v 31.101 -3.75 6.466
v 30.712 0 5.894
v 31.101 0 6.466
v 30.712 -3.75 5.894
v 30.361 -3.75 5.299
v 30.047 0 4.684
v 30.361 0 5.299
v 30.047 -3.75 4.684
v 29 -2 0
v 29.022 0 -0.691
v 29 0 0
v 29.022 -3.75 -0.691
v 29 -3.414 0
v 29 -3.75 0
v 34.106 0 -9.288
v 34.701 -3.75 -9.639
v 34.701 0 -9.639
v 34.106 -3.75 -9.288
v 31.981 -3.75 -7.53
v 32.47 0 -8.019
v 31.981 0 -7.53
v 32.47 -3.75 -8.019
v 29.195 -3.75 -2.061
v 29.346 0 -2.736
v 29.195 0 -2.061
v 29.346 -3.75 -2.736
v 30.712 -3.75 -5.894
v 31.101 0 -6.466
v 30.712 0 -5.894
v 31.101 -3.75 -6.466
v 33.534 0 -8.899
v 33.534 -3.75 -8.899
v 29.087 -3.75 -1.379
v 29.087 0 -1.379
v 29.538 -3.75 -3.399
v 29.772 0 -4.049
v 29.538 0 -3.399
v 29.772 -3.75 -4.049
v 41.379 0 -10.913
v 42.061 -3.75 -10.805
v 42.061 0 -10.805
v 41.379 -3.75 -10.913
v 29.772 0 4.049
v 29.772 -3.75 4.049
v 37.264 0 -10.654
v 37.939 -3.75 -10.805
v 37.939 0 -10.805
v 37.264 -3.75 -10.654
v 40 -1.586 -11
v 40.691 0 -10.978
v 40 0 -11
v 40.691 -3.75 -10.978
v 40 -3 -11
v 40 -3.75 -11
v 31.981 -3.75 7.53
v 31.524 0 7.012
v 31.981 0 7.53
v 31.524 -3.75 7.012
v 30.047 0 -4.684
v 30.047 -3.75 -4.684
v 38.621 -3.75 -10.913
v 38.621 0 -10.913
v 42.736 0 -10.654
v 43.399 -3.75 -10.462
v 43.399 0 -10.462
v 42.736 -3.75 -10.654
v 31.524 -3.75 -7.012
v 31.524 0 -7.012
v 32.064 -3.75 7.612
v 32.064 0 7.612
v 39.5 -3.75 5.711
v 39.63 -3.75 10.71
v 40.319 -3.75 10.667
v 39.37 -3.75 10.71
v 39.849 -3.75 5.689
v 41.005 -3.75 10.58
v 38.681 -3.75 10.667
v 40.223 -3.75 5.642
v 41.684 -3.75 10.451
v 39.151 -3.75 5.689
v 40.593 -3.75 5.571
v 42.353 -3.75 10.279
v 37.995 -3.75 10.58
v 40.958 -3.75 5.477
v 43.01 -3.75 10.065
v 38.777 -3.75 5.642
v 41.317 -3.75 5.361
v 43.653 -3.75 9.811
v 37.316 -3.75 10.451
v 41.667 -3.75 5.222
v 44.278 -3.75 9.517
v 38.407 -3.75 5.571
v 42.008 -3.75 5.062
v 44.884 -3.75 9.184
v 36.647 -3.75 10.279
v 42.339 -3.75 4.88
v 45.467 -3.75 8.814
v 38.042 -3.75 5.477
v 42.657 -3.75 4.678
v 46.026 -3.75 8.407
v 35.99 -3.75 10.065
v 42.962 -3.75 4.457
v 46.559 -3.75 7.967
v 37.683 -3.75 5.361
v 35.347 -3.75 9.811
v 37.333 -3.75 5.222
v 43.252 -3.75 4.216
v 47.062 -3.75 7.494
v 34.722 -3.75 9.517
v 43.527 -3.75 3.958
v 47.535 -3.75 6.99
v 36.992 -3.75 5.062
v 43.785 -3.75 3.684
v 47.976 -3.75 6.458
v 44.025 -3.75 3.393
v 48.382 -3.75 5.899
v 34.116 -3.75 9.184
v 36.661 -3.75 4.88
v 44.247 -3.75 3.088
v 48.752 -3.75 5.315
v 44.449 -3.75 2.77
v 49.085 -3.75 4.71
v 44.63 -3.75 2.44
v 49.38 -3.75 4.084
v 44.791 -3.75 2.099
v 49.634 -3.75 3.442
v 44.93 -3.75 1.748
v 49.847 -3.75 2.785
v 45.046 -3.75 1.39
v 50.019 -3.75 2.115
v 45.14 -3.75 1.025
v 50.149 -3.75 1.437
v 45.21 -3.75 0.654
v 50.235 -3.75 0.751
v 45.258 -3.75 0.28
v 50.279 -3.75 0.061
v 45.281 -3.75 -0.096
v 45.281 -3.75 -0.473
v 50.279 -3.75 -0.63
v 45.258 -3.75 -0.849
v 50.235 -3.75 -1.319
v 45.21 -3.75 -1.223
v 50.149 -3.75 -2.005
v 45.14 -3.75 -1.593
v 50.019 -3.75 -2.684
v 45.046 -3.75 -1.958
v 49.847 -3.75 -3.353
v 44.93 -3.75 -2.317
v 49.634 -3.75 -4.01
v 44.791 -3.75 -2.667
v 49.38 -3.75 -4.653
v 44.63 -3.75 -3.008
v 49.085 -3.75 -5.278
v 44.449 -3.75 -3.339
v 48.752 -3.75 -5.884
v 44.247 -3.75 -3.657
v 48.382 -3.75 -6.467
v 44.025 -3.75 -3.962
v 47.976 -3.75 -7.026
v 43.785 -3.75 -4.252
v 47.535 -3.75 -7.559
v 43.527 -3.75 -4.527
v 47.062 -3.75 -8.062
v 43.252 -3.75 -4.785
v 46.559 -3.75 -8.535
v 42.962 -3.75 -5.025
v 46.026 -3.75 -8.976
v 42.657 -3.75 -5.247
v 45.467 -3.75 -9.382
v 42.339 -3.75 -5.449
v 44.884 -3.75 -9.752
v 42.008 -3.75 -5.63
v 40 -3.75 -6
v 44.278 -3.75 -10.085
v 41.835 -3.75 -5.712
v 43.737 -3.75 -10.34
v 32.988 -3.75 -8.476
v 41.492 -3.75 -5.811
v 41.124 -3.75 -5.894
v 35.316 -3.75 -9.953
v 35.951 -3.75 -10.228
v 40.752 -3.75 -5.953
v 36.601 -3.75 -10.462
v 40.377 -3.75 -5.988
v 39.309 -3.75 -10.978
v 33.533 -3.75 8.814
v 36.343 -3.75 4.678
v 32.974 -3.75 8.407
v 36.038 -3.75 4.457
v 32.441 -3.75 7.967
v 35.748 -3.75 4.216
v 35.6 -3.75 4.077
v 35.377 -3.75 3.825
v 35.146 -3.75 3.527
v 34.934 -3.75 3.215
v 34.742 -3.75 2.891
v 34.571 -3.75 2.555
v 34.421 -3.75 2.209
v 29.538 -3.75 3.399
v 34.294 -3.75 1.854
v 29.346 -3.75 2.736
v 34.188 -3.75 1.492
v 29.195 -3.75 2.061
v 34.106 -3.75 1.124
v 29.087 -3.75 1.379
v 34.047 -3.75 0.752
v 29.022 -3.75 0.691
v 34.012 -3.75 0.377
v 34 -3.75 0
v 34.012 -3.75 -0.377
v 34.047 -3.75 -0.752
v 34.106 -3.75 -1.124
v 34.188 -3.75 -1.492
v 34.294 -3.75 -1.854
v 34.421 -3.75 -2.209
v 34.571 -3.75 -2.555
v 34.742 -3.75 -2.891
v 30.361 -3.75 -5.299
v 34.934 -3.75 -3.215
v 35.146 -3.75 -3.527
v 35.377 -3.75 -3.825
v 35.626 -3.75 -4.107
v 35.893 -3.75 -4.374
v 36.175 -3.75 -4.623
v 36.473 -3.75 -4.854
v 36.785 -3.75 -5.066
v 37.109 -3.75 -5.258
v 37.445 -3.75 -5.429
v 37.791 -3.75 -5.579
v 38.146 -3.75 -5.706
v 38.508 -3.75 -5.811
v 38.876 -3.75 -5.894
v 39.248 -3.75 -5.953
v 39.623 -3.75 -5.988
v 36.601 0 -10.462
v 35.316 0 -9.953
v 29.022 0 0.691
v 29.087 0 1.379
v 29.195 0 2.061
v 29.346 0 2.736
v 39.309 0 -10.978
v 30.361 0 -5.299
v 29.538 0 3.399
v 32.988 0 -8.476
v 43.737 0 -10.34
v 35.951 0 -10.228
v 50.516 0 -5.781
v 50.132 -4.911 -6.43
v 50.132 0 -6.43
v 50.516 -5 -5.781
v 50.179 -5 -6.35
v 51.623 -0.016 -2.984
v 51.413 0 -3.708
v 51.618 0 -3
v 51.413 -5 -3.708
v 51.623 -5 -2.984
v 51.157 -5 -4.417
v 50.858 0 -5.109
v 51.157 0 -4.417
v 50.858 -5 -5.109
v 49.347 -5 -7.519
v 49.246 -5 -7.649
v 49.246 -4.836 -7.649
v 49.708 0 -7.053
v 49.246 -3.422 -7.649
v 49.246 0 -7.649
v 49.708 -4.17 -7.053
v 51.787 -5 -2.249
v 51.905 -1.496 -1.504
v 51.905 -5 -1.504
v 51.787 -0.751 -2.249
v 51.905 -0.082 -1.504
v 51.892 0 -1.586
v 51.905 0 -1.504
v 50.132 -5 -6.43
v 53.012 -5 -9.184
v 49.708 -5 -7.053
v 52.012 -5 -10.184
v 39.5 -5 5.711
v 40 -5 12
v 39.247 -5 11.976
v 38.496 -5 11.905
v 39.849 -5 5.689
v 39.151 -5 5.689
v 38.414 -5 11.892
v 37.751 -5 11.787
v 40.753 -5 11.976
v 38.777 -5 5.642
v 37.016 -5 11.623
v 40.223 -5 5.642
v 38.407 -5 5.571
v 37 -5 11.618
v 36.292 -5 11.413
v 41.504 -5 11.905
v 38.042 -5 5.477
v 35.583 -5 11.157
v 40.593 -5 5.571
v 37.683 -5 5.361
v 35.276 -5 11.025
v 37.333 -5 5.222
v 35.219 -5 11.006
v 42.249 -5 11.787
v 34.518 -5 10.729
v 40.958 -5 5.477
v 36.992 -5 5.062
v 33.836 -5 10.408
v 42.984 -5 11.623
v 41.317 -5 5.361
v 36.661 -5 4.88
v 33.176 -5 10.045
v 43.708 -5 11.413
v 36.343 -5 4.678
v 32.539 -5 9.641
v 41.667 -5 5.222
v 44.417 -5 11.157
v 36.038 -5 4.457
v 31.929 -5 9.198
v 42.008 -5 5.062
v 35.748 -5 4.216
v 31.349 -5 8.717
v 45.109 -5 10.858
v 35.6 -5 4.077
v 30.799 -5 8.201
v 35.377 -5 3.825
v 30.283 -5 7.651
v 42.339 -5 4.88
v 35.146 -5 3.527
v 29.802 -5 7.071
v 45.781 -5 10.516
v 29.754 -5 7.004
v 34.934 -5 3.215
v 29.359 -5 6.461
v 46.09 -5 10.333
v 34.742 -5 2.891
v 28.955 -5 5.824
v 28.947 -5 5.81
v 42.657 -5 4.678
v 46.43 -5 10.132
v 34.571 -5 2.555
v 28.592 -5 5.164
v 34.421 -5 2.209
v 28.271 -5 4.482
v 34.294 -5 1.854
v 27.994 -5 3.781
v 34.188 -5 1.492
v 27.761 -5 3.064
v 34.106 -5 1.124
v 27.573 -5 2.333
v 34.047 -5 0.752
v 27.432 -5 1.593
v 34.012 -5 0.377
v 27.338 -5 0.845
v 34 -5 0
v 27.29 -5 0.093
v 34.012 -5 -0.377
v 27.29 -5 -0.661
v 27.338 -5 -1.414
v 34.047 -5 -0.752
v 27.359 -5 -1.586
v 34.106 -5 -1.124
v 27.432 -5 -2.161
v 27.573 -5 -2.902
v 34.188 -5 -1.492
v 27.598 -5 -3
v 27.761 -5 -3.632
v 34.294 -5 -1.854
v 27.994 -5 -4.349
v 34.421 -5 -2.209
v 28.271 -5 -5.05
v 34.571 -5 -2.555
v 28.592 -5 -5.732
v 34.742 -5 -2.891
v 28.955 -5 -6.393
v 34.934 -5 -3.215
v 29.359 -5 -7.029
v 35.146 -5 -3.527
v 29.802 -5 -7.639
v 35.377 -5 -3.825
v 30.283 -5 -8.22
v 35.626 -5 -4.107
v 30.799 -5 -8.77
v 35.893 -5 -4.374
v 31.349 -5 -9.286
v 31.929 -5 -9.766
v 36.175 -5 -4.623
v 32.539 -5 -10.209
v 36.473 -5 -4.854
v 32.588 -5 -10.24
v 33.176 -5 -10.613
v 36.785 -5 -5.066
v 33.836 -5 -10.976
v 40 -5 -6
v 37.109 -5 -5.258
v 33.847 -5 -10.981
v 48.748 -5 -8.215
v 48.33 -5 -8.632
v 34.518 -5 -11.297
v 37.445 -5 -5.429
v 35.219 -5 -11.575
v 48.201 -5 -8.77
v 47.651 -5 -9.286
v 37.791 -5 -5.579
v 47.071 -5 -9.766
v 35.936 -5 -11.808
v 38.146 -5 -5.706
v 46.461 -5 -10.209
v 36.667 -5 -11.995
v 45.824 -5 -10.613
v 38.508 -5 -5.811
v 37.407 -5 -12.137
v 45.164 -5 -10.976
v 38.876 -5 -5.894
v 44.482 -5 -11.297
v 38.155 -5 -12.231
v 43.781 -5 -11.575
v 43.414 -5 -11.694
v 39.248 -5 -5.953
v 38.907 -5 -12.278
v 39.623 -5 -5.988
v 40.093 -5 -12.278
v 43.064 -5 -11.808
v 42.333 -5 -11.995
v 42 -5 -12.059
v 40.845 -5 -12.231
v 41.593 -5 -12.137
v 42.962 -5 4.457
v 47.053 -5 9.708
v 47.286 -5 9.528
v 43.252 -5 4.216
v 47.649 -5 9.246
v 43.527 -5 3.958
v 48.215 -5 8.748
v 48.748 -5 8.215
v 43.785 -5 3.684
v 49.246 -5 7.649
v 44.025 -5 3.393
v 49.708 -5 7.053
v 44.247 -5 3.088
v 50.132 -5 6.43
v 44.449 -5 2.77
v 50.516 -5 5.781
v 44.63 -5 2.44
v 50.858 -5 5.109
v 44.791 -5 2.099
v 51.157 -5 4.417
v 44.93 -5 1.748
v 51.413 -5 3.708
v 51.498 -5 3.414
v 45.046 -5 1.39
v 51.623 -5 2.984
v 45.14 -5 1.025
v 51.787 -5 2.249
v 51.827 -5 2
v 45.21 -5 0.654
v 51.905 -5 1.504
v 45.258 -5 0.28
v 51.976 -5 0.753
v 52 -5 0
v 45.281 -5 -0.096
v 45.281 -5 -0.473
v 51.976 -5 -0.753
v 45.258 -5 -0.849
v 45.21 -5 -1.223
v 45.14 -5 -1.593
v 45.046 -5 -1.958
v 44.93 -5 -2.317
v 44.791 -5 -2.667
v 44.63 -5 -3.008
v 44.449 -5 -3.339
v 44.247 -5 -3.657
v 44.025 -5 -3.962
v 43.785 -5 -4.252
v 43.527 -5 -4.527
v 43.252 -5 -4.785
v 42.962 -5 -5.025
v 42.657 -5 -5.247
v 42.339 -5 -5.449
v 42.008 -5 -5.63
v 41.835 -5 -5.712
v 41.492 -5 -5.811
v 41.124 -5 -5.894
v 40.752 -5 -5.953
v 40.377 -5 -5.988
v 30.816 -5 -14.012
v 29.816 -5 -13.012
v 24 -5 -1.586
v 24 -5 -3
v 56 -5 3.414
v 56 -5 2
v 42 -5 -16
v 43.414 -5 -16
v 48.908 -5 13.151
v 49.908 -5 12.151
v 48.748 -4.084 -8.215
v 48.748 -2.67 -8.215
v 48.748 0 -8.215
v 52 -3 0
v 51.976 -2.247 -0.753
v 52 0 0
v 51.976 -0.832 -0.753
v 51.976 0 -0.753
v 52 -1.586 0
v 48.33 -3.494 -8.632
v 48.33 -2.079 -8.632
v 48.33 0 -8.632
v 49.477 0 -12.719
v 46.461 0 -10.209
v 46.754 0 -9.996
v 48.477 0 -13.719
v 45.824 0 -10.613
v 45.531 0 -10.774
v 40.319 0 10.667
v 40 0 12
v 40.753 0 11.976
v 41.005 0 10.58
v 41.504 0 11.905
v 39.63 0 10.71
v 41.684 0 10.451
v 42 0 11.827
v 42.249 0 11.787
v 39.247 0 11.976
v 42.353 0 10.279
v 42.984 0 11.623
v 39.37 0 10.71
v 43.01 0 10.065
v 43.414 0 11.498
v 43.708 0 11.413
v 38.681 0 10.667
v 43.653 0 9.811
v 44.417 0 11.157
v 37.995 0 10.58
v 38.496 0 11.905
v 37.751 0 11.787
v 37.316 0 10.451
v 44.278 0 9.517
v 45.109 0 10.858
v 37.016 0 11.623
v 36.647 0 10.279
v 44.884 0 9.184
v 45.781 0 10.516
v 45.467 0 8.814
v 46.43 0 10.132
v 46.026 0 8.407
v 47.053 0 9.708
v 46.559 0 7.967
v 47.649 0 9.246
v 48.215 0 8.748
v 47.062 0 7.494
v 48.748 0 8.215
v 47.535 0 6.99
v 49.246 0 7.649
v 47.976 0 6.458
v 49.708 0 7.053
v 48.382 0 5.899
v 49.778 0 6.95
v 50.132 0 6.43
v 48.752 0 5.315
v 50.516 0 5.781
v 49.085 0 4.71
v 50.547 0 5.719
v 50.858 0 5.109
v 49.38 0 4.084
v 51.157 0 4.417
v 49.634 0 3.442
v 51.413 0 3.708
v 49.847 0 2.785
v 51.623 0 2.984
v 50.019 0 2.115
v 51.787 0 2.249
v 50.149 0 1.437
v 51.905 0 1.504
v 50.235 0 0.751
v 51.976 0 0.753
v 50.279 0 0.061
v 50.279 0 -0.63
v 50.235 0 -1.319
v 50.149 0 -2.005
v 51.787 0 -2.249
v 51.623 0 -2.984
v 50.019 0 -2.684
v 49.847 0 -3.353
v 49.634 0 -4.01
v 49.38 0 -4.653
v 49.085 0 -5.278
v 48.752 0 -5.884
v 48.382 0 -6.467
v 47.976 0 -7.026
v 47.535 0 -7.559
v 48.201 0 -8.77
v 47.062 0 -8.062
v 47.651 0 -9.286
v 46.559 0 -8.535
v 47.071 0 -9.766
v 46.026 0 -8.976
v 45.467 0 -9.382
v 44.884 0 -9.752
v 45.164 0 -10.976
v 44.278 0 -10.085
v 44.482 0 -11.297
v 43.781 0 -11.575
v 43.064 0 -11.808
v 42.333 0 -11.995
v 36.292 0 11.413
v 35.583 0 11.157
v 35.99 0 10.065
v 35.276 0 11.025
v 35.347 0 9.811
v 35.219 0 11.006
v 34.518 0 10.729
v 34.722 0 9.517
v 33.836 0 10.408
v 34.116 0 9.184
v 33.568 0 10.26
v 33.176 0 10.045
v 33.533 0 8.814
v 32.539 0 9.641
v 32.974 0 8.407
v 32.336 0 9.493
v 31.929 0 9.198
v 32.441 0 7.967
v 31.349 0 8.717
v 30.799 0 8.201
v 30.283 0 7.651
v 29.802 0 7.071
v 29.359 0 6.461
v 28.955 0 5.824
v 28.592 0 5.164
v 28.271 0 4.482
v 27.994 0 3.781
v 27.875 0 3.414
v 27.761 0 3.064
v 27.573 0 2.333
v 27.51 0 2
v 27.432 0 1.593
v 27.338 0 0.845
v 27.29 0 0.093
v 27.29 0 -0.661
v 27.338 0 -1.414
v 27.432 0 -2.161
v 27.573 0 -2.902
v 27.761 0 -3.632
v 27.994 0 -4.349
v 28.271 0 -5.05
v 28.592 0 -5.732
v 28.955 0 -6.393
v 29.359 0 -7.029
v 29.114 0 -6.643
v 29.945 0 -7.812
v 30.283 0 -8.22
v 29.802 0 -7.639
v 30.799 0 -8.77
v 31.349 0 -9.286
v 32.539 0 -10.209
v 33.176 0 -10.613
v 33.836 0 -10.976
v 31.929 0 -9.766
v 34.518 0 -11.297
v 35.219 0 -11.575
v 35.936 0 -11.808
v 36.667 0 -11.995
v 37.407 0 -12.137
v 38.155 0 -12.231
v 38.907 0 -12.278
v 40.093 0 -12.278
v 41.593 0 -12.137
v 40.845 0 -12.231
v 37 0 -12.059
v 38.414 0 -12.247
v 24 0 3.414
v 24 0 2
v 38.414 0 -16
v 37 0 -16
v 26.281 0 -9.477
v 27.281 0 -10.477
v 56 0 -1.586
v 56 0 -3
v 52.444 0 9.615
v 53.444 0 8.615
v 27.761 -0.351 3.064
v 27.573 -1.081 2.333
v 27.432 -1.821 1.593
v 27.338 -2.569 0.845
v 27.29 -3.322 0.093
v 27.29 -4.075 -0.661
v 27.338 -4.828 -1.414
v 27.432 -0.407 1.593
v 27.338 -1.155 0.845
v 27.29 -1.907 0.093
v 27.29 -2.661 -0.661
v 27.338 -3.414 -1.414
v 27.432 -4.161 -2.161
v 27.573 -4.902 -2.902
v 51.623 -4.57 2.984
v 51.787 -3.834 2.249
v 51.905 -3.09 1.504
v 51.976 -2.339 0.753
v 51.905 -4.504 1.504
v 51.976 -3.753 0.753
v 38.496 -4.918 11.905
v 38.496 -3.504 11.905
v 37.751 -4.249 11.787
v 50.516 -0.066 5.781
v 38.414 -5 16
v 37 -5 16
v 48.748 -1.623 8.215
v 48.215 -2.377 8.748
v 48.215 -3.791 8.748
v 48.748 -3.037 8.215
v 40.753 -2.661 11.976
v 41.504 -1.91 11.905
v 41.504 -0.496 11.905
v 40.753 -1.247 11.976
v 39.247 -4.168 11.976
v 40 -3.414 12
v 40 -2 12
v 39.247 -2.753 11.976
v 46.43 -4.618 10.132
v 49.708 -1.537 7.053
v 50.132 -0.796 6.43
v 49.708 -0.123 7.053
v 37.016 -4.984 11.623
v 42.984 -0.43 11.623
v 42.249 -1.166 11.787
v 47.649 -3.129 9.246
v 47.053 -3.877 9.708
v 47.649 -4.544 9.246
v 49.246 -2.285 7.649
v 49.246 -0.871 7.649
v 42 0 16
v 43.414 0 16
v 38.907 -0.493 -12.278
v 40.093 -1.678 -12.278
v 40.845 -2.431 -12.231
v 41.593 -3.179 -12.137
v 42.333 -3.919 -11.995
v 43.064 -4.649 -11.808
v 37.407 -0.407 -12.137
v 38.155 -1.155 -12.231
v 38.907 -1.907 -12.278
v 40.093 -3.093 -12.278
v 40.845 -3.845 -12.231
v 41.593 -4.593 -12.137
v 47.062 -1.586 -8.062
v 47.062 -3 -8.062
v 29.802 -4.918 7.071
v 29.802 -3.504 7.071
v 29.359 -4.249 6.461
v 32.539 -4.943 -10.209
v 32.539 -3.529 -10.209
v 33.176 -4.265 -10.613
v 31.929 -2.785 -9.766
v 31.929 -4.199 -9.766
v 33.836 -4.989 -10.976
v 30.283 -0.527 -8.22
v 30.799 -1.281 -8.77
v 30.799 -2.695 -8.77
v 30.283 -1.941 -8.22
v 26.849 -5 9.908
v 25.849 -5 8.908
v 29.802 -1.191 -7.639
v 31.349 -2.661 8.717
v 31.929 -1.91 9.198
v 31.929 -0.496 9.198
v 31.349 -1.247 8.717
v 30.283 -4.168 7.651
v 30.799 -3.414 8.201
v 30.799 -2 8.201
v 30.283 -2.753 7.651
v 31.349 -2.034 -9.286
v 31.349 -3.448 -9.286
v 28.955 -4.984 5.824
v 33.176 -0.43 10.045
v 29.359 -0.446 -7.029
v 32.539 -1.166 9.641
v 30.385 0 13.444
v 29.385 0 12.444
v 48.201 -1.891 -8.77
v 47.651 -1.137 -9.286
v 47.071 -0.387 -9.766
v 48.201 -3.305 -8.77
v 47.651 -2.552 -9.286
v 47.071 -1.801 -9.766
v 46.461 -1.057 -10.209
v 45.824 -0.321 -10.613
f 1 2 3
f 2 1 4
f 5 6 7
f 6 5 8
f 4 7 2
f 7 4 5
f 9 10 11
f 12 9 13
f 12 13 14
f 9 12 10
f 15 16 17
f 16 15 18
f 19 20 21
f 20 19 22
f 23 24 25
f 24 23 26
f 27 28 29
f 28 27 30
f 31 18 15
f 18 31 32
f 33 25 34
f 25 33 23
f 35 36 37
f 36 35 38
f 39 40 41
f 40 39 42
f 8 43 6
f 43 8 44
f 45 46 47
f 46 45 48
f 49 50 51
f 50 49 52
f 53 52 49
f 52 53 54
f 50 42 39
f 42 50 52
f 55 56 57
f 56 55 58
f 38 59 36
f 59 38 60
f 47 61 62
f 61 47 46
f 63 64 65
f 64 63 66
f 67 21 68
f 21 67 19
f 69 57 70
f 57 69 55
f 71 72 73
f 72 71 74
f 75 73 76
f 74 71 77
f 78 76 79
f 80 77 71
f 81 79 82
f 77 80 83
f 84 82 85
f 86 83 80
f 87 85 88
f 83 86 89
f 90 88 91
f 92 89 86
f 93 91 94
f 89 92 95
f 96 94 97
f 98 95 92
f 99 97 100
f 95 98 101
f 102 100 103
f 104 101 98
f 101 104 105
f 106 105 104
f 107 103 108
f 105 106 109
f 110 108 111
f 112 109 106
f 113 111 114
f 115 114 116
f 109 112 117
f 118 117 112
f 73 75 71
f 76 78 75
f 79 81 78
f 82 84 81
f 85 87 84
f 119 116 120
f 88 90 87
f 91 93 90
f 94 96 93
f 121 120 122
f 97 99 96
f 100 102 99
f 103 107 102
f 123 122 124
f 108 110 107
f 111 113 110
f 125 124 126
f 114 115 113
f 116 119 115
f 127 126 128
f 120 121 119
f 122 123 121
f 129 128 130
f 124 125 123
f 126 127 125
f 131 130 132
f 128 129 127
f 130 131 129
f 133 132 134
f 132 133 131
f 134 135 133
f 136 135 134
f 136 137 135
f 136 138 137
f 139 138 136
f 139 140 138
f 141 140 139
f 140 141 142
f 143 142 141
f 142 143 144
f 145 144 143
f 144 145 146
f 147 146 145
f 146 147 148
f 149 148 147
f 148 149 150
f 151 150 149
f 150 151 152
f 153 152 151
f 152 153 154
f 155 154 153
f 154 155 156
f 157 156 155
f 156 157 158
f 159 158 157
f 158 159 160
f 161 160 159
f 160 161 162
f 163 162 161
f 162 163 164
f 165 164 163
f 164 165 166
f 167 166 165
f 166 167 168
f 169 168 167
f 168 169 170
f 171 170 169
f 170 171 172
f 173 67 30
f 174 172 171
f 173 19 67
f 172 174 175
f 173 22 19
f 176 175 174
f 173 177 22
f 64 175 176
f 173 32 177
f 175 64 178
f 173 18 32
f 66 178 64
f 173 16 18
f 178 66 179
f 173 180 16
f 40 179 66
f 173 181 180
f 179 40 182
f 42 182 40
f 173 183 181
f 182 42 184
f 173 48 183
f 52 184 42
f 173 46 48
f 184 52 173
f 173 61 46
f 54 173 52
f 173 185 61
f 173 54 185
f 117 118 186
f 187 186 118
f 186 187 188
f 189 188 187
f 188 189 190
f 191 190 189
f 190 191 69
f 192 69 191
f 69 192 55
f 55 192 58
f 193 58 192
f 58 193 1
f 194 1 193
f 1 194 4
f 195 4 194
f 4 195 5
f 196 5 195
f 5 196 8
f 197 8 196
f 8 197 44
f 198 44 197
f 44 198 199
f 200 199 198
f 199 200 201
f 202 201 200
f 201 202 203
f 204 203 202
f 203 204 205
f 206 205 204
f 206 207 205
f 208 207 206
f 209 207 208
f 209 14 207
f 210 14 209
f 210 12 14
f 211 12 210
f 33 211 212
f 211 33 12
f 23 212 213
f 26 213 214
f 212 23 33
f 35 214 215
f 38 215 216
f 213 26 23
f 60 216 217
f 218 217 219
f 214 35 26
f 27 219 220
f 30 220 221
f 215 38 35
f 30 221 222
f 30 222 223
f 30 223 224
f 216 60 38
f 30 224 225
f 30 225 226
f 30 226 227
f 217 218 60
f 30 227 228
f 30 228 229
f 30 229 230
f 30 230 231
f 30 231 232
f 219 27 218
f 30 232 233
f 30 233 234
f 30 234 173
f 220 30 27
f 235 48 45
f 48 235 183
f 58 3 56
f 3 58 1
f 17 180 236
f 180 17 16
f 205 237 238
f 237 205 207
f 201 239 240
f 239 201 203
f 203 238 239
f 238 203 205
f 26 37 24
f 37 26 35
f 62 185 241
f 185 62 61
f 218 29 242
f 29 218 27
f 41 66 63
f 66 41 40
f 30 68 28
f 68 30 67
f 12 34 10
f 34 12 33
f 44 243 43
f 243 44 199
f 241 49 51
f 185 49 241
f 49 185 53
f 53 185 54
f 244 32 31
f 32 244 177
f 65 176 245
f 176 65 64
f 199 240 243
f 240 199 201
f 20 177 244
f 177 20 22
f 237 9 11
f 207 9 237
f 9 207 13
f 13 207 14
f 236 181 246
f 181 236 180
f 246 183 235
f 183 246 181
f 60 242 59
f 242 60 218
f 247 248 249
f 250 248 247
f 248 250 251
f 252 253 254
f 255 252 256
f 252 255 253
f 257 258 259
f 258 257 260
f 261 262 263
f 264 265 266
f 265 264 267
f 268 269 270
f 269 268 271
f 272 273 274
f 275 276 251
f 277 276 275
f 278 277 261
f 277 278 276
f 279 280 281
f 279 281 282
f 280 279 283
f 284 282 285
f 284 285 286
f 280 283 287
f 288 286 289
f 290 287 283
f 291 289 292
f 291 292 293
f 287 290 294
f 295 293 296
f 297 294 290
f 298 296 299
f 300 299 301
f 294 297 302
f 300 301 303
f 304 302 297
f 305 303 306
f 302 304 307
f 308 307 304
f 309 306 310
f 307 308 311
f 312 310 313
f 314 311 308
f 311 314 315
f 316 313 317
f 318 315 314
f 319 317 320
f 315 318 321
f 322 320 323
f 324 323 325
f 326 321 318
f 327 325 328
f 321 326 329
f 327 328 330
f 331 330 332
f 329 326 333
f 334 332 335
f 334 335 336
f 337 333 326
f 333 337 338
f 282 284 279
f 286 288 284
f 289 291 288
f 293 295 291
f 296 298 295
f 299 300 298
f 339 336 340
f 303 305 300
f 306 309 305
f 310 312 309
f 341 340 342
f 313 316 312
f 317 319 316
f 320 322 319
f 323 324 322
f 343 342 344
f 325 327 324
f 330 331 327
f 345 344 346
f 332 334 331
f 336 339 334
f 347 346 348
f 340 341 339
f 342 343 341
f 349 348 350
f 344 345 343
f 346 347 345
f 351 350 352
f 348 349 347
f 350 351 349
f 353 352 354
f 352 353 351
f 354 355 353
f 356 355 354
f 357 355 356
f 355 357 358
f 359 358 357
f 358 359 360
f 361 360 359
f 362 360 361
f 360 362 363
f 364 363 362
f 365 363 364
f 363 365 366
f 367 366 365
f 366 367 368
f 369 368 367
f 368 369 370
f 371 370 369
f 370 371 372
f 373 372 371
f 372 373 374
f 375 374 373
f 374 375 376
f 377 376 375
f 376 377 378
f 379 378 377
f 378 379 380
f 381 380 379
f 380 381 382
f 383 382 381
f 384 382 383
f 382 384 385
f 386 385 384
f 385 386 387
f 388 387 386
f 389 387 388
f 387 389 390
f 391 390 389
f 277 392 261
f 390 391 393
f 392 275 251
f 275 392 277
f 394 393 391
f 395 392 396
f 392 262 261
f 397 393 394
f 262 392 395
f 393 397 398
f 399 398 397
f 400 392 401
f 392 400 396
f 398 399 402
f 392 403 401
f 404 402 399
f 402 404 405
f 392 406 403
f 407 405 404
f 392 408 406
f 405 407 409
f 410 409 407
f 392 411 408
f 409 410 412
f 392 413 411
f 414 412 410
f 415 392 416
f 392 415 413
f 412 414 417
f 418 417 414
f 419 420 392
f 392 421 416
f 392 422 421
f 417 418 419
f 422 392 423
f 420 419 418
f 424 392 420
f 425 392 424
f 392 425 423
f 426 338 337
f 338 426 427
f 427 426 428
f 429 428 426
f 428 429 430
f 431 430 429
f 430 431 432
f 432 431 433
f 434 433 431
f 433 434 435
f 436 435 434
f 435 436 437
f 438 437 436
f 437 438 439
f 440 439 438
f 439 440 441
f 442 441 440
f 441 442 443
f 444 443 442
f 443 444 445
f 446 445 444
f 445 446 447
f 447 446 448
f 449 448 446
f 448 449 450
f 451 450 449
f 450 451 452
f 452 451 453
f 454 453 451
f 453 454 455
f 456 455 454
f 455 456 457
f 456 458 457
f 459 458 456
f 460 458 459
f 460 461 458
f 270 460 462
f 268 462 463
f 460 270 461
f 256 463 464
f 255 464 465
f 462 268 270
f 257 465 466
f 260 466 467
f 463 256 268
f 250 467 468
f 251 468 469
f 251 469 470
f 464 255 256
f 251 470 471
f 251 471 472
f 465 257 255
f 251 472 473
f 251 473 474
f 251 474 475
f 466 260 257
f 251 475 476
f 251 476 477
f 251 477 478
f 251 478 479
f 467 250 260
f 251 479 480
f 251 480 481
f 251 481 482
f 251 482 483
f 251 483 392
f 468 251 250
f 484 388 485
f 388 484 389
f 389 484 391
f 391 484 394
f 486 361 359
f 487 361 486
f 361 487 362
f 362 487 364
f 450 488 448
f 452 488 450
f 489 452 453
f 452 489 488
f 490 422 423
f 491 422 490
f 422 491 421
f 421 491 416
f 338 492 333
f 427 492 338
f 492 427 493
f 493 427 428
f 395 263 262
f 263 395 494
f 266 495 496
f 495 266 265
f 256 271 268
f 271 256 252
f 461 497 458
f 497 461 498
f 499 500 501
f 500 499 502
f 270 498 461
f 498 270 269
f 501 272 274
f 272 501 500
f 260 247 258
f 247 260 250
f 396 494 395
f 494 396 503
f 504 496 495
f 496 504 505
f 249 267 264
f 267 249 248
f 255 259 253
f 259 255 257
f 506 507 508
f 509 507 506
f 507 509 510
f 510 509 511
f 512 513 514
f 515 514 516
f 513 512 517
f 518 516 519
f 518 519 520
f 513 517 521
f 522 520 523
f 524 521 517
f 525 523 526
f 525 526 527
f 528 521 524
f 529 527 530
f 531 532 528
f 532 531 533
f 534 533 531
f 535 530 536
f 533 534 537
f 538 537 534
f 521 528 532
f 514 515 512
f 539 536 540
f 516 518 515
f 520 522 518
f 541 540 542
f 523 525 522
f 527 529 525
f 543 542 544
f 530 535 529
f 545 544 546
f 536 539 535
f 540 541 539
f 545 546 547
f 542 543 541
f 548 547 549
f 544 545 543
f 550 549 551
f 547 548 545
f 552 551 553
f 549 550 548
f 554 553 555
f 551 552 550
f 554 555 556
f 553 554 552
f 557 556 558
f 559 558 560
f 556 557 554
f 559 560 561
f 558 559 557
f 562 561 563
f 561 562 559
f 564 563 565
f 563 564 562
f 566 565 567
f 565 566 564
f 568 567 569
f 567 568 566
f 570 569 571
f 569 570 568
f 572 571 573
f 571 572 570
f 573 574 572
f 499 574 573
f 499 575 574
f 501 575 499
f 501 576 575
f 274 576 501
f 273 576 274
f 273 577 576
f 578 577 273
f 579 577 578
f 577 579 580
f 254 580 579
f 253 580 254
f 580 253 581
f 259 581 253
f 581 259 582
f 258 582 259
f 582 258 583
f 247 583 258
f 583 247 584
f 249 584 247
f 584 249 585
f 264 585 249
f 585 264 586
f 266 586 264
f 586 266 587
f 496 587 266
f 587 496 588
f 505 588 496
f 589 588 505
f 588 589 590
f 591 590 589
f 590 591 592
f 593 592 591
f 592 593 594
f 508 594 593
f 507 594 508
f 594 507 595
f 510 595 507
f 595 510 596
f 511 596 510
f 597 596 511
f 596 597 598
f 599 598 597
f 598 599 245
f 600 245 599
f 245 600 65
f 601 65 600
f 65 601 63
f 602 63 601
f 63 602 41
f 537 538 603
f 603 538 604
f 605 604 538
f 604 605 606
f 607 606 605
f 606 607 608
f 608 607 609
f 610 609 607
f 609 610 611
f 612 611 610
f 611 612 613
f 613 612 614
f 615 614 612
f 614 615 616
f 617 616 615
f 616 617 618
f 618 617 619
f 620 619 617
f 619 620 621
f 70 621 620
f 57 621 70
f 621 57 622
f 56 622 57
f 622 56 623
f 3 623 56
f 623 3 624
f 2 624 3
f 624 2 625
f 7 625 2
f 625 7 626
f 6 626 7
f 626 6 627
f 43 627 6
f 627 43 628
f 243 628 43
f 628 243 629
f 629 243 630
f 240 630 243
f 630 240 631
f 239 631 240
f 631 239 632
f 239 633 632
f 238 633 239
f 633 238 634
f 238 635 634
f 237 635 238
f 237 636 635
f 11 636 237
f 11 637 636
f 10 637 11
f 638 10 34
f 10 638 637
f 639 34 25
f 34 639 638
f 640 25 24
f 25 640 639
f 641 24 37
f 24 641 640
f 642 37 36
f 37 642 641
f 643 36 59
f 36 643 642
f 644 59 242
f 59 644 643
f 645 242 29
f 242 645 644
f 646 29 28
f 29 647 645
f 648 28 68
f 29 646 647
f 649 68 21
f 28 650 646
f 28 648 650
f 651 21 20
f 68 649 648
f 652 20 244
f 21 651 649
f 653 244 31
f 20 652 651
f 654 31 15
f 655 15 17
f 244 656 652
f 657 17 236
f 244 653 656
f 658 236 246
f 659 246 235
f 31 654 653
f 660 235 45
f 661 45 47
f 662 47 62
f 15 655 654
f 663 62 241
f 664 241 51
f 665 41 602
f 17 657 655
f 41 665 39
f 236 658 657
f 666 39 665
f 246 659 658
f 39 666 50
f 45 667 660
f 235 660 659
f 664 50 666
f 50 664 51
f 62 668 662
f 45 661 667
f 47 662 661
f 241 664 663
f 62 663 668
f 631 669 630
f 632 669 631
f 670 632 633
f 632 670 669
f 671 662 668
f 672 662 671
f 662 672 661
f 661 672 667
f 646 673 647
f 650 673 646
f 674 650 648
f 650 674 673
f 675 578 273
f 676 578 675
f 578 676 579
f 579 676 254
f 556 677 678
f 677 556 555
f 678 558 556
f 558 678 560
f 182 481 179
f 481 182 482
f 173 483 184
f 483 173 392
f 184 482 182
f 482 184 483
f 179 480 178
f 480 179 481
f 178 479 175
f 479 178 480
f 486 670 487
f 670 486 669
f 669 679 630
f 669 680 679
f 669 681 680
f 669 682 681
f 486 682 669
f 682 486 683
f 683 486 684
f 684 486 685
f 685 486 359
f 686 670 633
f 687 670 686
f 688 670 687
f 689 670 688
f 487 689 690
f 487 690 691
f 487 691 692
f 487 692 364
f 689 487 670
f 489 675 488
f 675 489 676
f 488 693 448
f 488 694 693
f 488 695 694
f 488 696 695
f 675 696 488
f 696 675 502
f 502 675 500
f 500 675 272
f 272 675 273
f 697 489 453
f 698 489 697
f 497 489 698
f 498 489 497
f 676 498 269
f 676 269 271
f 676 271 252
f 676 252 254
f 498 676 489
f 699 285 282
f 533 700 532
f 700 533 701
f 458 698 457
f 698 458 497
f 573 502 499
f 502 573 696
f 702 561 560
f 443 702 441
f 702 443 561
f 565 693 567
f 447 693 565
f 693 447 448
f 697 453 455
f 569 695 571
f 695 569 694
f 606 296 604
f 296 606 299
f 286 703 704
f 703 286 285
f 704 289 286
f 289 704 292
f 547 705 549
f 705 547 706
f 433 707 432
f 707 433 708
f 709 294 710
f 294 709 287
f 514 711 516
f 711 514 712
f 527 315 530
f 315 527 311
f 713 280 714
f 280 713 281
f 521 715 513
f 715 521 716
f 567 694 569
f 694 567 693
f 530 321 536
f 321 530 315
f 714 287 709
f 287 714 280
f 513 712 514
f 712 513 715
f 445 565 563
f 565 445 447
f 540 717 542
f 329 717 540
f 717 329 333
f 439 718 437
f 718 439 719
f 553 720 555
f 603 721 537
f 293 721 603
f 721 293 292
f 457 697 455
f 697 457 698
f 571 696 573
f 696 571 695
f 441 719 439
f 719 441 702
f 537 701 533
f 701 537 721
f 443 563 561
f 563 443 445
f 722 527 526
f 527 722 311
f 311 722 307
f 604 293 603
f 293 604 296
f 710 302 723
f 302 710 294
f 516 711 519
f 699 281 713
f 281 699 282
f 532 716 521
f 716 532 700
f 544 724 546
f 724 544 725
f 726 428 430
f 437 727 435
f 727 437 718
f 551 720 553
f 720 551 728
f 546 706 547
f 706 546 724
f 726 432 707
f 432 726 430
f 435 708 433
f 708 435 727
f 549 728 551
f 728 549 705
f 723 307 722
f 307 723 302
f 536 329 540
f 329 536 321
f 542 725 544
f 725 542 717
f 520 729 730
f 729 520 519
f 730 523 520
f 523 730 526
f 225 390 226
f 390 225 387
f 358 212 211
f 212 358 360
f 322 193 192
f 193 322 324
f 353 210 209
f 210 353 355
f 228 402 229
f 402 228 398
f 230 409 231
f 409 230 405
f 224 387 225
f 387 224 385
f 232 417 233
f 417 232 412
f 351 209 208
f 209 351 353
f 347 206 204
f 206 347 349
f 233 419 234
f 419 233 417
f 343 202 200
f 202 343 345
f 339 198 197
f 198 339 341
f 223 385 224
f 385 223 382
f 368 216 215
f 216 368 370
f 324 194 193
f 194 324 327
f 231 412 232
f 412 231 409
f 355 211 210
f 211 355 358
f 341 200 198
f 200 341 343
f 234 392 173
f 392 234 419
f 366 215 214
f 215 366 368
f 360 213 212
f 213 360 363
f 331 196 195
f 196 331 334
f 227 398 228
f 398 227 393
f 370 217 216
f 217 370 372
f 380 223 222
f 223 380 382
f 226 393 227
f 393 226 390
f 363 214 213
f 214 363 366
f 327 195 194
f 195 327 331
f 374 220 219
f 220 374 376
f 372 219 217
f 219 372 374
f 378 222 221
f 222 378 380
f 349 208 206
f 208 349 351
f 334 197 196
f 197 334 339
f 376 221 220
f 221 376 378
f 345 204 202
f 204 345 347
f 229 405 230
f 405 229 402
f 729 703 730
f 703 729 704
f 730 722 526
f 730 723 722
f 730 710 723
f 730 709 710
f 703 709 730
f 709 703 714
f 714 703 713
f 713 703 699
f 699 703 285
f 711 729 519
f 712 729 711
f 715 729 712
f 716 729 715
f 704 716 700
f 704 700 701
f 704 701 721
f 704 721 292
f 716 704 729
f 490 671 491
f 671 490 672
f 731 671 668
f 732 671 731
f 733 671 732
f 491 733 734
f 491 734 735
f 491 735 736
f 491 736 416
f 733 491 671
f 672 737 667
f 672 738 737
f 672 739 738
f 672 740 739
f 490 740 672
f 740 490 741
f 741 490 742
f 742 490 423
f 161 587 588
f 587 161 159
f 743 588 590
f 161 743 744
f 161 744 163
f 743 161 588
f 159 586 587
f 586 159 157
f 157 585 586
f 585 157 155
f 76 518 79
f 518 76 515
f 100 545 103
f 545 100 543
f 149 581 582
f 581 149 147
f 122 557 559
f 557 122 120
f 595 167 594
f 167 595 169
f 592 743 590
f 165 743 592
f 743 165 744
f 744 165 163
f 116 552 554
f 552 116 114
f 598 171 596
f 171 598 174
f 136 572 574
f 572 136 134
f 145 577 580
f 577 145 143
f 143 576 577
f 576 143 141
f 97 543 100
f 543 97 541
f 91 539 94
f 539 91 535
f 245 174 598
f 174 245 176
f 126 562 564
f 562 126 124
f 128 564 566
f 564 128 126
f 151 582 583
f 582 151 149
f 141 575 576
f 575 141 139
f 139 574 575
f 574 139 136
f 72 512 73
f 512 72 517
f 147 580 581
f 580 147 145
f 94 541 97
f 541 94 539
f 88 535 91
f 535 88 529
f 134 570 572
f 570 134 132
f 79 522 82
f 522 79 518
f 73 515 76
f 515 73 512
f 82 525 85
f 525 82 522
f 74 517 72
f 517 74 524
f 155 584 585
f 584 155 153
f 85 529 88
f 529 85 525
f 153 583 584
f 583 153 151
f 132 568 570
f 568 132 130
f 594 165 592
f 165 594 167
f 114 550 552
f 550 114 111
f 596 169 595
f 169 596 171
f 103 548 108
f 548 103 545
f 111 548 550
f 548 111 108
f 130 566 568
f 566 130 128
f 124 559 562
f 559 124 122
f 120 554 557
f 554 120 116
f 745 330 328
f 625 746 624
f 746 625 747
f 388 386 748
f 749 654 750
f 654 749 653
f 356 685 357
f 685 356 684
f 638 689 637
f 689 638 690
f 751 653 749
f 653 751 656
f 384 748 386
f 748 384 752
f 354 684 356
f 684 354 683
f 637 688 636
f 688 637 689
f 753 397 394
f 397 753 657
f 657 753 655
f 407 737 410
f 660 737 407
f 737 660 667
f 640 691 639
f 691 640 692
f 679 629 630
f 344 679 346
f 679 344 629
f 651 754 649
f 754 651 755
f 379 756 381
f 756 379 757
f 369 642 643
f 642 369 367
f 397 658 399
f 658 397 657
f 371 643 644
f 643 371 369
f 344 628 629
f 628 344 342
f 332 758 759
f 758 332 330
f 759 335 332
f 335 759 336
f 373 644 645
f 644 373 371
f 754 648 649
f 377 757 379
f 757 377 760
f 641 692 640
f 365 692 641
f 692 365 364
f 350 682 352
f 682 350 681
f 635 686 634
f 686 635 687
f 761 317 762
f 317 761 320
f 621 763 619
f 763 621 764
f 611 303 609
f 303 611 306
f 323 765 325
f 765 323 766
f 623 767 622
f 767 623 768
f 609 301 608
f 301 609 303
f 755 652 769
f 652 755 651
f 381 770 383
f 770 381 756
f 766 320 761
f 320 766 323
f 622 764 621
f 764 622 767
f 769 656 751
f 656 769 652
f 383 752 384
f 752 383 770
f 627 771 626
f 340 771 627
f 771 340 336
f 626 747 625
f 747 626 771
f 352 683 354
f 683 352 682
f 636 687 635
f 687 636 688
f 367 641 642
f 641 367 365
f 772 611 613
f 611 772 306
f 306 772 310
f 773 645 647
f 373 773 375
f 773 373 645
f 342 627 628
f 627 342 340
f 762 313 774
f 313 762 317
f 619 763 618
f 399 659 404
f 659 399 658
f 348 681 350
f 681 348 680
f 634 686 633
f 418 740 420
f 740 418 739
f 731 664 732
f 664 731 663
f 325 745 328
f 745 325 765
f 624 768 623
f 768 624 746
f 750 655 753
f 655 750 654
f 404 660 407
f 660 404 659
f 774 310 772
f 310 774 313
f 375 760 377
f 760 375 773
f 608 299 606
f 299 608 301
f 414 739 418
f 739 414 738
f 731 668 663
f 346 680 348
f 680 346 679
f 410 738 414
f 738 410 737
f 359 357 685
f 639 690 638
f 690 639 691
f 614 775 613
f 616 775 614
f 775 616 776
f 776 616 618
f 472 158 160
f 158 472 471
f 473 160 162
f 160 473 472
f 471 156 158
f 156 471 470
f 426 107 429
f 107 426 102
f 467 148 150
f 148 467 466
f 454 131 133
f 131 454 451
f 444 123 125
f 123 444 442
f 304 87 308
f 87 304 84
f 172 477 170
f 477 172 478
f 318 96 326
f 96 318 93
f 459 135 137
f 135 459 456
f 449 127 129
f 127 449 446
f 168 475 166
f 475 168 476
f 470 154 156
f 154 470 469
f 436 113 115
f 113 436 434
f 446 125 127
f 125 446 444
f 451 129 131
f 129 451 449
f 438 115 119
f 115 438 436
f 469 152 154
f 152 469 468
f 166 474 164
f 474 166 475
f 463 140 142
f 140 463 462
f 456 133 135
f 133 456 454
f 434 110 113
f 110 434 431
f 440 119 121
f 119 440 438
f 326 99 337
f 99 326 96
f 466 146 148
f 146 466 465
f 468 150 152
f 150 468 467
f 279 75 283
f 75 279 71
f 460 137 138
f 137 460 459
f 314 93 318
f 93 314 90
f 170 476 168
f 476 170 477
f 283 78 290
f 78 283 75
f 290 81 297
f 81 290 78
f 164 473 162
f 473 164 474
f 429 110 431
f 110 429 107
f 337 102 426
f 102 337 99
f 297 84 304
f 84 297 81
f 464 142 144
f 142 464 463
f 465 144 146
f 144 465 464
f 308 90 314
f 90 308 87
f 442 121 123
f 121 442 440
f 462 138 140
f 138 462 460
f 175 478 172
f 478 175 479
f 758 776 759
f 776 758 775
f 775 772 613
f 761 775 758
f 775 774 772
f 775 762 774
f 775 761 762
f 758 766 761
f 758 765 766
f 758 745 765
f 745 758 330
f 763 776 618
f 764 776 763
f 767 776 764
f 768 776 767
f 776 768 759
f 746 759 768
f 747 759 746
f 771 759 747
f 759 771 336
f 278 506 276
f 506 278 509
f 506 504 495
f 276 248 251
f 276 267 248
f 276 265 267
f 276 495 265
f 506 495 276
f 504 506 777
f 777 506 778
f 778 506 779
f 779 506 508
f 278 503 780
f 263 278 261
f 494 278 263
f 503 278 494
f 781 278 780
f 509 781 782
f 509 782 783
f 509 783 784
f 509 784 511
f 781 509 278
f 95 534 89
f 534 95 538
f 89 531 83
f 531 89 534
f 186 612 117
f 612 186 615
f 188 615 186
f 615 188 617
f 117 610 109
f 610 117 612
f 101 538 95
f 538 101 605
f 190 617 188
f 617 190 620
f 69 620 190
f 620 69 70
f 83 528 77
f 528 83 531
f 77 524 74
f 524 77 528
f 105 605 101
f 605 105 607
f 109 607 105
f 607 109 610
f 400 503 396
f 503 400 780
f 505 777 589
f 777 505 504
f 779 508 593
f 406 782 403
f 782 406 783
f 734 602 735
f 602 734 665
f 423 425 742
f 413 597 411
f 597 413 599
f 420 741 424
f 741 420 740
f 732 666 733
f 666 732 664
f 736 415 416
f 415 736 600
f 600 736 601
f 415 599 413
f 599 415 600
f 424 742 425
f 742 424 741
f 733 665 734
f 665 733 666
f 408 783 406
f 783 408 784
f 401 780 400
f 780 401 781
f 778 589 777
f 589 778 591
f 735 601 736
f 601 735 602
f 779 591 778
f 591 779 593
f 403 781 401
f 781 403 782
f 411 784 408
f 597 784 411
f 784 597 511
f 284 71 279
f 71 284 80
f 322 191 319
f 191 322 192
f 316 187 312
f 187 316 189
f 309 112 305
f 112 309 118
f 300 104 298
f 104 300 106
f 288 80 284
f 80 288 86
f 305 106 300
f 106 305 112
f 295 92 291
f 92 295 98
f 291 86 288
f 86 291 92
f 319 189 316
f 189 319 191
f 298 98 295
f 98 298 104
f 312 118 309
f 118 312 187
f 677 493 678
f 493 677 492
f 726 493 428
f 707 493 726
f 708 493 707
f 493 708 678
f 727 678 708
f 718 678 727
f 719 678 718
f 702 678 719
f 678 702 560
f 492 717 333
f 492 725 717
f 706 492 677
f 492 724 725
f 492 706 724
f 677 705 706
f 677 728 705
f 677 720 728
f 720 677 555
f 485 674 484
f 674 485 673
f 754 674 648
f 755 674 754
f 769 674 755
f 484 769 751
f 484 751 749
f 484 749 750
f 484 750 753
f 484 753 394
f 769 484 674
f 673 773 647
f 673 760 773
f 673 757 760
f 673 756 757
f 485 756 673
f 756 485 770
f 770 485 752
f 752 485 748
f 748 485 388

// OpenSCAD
$fn = 100;

module magnet() {
    cube([10.5, 10.5, 4.5], true);
}

module spinner_magnet() {
    cube([10.5, 5.5, 2.5], true);
}

module bearing(){
    color("yellow") 
    difference() {
        cylinder(7.5, 11, 11, true);
        cylinder(10, 4, 4, true);
    }
}

module spinner2(a) {
    
    difference() {
        rotate([0,0,a]) translate([40,0,0]) rotate([90,0,0]) rotate([0, 0, -$t*360]) bearing_spinner_enclosure();
        rotate([0,0,a]) translate([40,0,0]) rotate([90,0,0]) bearing();
        rotate([0,0,a]) translate([40,3,0]) rotate([90,0,0]) bearing();
        rotate([0,0,a]) translate([40,10,0]) rotate([90,0,0]) cylinder(30, 6, 6);
    }
    
}

module fan(a) {
    rotate([0, 0, 0]);
    difference() {
        union() {
            translate([24, -6, -4]) 
            rotate([45, 0, 0])
            cube([5, 10, 1]);
            
            translate([51, -6, 3]) 
            rotate([-45, 0, 0])
            cube([5, 10, 1]);
        }
        
        translate([20, 0, -5]) 
        cube([55, 10, 15]);
        translate([20, -15, -5]) 
        cube([55, 10, 15]);
    }
}

module fans() {
    union(){
        spinner(0);
        rotate([0, 0, 0]) {
            fan(0);
        }
    }
}

translate([40, 0, 40]) rotate([0, 90, 0]) fans();
translate([11, 0, 28]) rotate([0, 45, 0]) fans();
translate([68, 0, 28]) rotate([0, 135, 0]) fans();
fans();





module spinner(a) {
    difference() {
        rotate([0,0,a]) translate([40,0,0]) rotate([90,0,0]) cylinder(5, 12, 12);
        rotate([0,0,a]) translate([40,0,0]) rotate([90,0,0]) bearing();
        rotate([0,0,a]) translate([40,3,0]) rotate([90,0,0]) bearing();
        rotate([0,0,a]) translate([40,10,0]) rotate([90,0,0]) cylinder(30, 6, 6);
    }
}

module bearing_spinner_enclosure() {
    difference() {
        color([0,1,1,0.5]) cylinder(10, 16, 16, true);
        for (i = [1:8]) {
            rotate([0,90,i*45]) translate([0,14.8,0]) rotate([90,0,0]) spinner_magnet();
        }
    }
}

module spinners() {
    for ( i = [1 : 8] ){
        spinner(i*45);
    }
}

module fixtures() {
    for ( i = [1 : 4] ){
        difference() {
            rotate([0, 0, i*90]) translate([17, 0, -28]) cylinder(10, 3, 3);
            rotate([0, 0, i*90]) translate([17, 0, -35]) cylinder(25, 1.5, 1.5);
        }
    }
}



module avoiders() {
    for ( i = [1 : 16] ){
        rotate([0, 0, i*22.5+10]) translate([0, 61, 0]) rotate([90,0,0]) rotate([0, 0, 90]) magnet();
        rotate([0, 0, i*22.5+5]) translate([0, 54.5, -16.5]) rotate([45,0,0]) rotate([0, 0, 90]) magnet();
        rotate([0, 0, i*22.5]) translate([0, 39, -22]) rotate([0,0,0]) rotate([0, 0, 90]) magnet();
    }
}


//fixtures();

module donut(a=0, b=0) {
    
    wheel_radius = a;
    tyre_diameter = b;
    difference() {
        color("blue") rotate_extrude(angle=360) {
         translate([wheel_radius - tyre_diameter/2, 0, 0]) circle(d=tyre_diameter);
        }
        avoiders();
    }
    
}

module cutaways() {
    a = 150;
    translate([0,0,26]) cube([a, a, a/4], true);
    cylinder(60, 14, 14, true);
    translate([0,0,20]) cube(60, true);
    translate([0,0,-78]) cube(100, true);
}

module inner_bracket_head() {
    difference() {
        union() {
            // holding clyinder
            for ( i = [1 : 8] ){
                // bearing axis
                color("red")  rotate([0,0,i*45]) translate([40,0,0]) rotate([0,90,90]) cylinder(7.5, 3.85, 3.85, true);
                // squared arm
                color("red")  rotate([0,0,i*45]) translate([20,-8,0]) cube([40, 4, 9], true);
                color("red")  rotate([0,0,i*45]) translate([40,-8,0]) rotate([0,90,90]) cylinder(4, 4.5, 4.5, true);
                //pusher cyliner
                color("red")  rotate([0,0,i*45]) translate([40, -4.5,0]) rotate([0,90,90]) cylinder(3, 4.5, 4.5, true);
            }
            
            color("red") cylinder(9, 10, 10, true);
            union() {
                $fn = 8;
                difference() {
                    color("red") rotate([0,0,22.5]) cylinder(9, 23, 23, true);
                    rotate([0,0,22.5]) cylinder(12, 19, 19, true);
                }
            }
        }
        color("black") cylinder(30, 3, 3, true);
    }
    //spinners();
}

module main(d=0) {
    difference() {
        donut(d, d-3);
        donut(d-3, d-17); // cutaway inside dount
        cutaways(); // cutaway half
    }
}

size = 65;

//main(size);
//rotate([180,0,0]) main();

//rotate([0,0,$t*(360/8)]) inner_bracket_head();



//avoiders();

spinner(0);





























//
